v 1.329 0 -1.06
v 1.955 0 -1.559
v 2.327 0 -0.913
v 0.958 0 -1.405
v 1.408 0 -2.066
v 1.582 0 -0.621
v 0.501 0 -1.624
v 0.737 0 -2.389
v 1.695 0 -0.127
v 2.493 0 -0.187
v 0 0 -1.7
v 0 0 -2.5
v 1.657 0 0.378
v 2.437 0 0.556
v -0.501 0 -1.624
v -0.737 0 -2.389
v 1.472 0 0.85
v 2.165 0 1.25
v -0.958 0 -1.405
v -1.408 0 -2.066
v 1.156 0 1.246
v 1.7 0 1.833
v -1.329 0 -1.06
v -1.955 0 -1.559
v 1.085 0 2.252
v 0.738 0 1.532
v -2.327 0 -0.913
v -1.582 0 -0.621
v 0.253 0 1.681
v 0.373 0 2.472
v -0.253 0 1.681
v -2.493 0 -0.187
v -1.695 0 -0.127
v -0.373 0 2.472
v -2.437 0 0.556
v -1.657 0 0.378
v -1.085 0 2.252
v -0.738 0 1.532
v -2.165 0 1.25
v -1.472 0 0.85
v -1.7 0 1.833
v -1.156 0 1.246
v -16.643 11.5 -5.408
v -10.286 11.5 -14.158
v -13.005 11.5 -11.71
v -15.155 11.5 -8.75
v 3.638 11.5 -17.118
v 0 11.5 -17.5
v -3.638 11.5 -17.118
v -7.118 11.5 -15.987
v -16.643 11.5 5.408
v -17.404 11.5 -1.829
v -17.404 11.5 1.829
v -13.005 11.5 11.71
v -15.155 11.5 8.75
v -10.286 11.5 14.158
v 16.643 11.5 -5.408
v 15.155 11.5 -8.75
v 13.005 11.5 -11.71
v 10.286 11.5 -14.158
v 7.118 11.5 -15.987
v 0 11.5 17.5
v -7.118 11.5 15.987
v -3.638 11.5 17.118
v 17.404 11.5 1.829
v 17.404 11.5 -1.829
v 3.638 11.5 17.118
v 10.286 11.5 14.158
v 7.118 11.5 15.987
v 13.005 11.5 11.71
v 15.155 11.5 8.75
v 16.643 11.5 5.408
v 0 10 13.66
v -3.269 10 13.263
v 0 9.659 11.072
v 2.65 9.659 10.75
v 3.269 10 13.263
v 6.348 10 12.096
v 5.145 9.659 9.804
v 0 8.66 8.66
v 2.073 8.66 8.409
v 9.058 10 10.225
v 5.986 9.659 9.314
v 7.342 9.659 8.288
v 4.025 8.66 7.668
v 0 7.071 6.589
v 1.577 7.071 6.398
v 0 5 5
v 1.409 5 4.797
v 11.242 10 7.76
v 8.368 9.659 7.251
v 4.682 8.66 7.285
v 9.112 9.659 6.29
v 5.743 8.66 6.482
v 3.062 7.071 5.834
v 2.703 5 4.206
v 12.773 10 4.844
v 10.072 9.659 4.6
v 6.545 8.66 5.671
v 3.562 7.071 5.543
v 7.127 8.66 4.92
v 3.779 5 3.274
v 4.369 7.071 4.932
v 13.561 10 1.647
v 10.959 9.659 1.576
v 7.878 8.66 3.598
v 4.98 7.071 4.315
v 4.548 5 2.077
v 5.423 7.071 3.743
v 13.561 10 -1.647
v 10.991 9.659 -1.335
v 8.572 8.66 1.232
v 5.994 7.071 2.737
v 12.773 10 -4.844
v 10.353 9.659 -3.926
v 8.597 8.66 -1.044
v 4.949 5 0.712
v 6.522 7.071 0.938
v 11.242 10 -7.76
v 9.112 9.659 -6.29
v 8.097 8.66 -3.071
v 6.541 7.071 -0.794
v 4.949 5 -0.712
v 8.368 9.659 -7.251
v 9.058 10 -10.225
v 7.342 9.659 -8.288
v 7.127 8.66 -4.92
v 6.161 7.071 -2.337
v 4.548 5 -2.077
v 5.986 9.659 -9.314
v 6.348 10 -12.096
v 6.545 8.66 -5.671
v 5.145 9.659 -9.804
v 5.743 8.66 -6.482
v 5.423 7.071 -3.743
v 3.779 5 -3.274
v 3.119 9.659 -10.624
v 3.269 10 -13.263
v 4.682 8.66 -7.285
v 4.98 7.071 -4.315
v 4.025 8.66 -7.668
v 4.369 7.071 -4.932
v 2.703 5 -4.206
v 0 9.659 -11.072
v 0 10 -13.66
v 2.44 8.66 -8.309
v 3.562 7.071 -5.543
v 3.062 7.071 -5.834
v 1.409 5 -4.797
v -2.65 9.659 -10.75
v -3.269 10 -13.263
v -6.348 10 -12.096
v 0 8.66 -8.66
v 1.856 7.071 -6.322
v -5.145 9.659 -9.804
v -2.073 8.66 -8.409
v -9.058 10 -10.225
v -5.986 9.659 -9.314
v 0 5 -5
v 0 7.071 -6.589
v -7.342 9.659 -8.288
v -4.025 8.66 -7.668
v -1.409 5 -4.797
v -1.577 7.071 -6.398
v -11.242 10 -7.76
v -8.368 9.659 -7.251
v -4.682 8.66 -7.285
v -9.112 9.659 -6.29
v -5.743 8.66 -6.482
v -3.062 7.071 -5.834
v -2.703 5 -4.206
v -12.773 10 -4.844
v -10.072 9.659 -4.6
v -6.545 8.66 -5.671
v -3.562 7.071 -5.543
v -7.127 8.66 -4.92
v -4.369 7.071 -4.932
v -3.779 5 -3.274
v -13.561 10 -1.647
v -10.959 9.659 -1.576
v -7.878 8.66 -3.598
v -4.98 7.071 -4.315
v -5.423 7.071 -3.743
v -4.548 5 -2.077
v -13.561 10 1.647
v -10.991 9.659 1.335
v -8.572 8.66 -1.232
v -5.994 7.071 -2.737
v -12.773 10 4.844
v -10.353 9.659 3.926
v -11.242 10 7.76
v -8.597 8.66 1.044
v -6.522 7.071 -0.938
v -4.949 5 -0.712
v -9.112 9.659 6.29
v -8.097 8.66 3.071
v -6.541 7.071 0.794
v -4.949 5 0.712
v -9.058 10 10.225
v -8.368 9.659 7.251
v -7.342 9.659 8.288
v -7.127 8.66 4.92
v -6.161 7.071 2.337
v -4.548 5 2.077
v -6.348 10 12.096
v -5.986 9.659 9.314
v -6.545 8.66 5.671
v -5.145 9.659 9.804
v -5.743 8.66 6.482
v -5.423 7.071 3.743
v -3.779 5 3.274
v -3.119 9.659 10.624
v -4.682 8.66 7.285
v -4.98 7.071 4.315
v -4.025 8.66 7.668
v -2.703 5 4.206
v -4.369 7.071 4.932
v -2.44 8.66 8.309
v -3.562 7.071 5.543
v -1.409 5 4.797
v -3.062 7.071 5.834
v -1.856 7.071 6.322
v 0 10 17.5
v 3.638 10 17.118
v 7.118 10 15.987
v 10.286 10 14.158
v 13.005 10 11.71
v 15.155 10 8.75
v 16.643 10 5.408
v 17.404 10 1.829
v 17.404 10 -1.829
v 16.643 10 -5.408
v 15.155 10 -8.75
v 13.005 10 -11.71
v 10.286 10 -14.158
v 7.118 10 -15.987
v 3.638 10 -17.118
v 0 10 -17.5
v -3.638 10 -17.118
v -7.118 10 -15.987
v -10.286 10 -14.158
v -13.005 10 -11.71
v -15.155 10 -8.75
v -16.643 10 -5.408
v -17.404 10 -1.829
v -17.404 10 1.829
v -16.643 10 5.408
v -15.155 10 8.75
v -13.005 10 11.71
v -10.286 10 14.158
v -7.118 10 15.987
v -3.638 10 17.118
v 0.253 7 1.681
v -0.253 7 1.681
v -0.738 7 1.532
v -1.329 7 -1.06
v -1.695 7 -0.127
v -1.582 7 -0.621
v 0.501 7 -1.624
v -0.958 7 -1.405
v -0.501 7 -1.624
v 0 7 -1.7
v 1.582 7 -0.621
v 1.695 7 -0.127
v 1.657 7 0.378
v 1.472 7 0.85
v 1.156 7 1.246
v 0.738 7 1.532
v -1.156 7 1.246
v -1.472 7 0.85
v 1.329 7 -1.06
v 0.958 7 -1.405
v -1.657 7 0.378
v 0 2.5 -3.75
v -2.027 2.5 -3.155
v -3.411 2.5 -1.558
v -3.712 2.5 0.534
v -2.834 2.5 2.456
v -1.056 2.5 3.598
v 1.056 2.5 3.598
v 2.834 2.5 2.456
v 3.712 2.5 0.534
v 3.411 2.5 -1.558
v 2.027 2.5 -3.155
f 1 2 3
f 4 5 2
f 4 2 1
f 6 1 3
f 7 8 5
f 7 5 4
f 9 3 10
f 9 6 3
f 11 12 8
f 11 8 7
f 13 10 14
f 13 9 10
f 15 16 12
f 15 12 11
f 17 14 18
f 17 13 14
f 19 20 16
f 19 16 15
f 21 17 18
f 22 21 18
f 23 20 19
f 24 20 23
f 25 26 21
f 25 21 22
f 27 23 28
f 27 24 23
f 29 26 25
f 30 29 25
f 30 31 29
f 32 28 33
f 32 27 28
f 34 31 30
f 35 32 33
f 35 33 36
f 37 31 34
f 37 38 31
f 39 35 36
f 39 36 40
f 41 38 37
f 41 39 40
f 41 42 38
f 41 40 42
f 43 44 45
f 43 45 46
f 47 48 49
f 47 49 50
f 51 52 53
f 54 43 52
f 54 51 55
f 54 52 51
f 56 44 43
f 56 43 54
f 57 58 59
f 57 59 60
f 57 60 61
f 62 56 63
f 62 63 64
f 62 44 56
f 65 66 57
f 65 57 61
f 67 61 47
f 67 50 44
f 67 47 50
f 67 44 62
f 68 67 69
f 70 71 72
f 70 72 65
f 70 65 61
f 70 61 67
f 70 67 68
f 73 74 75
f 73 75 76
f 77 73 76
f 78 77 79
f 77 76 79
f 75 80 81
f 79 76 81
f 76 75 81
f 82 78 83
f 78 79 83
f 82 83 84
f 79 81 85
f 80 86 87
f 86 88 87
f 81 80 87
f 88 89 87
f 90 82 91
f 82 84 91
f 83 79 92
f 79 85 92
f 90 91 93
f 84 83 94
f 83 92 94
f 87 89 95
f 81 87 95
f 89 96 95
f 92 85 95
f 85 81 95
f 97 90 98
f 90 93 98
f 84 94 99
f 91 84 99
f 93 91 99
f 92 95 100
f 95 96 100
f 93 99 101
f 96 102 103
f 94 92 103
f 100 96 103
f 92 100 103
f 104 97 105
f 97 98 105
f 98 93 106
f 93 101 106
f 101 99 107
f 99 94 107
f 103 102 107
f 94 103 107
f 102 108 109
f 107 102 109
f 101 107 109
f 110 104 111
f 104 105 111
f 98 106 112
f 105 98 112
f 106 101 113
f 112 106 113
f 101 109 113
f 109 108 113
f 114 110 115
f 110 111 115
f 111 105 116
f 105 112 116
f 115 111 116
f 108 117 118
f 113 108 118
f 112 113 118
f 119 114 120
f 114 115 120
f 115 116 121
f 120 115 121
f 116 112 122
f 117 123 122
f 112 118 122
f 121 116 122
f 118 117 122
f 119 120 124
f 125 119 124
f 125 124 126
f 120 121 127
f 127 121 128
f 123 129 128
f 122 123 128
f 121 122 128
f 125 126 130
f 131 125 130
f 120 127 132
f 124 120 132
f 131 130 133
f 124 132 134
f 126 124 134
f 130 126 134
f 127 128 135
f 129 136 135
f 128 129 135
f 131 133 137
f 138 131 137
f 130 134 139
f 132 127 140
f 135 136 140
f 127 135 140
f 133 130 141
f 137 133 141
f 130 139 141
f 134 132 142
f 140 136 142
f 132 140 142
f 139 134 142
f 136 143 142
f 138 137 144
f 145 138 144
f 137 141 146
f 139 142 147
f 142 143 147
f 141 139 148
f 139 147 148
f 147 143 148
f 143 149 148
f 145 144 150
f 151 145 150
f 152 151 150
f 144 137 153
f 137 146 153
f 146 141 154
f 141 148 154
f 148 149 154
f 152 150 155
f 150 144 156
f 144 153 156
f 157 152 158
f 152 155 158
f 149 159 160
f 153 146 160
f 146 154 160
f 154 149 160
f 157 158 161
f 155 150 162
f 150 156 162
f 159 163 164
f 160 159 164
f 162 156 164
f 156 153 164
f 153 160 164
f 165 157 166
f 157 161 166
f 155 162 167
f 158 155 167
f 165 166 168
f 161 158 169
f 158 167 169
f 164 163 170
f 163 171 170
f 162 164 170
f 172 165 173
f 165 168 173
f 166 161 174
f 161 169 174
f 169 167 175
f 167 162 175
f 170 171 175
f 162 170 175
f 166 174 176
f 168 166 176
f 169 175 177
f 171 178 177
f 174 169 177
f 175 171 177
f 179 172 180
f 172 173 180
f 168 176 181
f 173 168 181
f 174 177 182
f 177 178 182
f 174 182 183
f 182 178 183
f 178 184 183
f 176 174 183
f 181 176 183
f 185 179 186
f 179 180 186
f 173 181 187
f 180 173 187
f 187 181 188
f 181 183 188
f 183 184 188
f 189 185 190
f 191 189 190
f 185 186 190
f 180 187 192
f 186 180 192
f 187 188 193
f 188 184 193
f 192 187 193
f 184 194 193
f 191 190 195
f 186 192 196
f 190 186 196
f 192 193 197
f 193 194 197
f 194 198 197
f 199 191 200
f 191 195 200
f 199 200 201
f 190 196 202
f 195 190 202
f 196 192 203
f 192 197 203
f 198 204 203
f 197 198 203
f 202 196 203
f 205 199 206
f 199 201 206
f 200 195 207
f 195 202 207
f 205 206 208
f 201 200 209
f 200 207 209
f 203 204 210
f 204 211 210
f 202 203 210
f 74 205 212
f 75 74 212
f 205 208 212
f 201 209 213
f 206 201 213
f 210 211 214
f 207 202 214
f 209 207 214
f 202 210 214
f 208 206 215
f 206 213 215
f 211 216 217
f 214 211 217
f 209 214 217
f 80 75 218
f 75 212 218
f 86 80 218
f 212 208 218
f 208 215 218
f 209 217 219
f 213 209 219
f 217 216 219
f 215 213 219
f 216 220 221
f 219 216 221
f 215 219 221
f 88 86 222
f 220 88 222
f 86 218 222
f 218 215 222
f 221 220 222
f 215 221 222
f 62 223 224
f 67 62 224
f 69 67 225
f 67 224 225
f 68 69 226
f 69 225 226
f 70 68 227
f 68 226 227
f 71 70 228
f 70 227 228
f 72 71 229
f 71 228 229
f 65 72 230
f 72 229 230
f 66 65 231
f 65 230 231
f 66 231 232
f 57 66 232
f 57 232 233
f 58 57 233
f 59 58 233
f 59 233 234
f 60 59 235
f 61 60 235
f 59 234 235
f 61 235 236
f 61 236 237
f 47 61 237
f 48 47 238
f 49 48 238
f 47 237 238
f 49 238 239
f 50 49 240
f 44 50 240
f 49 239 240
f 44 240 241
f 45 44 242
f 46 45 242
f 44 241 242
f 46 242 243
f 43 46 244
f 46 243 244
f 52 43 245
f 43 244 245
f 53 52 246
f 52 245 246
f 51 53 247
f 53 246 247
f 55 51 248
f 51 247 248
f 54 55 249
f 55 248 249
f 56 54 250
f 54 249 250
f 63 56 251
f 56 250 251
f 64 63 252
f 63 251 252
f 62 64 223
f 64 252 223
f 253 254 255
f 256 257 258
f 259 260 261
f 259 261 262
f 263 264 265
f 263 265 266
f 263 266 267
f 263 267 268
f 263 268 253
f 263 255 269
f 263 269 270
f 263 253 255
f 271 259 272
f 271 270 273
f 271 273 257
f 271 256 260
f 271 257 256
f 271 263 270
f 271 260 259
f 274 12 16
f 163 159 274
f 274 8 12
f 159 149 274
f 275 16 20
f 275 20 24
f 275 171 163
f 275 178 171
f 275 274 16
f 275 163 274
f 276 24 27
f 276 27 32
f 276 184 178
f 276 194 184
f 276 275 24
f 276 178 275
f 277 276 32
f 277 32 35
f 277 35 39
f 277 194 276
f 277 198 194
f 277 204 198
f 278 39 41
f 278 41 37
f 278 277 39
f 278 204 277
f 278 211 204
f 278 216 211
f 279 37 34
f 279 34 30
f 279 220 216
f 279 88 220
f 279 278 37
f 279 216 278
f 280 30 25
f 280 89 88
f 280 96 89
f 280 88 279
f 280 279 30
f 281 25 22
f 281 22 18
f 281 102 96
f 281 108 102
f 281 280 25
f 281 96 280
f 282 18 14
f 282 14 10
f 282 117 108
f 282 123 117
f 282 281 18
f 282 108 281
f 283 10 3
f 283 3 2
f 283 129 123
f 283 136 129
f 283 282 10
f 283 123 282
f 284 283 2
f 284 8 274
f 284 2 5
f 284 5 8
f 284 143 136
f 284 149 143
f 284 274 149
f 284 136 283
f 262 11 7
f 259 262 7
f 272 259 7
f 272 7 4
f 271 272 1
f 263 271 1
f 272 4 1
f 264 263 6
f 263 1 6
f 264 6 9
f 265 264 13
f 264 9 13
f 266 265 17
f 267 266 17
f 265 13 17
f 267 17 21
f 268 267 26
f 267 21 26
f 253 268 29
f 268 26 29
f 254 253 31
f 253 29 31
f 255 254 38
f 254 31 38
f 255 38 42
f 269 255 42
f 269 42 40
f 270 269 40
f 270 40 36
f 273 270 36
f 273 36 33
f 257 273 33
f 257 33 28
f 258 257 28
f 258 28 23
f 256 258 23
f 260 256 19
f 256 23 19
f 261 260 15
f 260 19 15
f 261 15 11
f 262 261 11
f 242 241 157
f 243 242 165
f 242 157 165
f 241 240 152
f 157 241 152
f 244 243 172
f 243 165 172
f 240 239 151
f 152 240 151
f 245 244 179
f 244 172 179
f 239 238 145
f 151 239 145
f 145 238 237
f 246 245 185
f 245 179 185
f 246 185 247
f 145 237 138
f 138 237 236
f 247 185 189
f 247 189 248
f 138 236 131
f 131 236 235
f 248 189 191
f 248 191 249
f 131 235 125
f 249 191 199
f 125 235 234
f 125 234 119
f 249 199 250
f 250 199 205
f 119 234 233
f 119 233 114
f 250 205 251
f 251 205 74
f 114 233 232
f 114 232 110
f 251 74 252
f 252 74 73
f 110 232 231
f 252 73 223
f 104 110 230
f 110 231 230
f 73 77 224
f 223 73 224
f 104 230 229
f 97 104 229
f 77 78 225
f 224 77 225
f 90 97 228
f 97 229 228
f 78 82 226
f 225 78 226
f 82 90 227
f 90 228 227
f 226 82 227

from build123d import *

# Parameters (mm, degrees)
SKETCH5_R           = 5
BOSS_EXTRUDE2_DEPTH = 5
SKETCH6_R           = 17.5
BOSS_EXTRUDE3_DEPTH = 1.5
SKETCH7_R           = 1.7
CUT_EXTRUDE1_DEPTH  = 7
FILLET1_R           = 10


with BuildPart() as part:
    # Sketch3 → Revolve1 (revolve)
    with BuildSketch(Plane.XY, mode=Mode.PRIVATE) as revolve1_sk:
        Polygon((0, 0), (2.5, 0), (5, 5), (0, 5), align=None)
    revolve(revolve1_sk.sketch.rotate(Axis((0, 0, 0), (0, 1, 0)), 90), axis=Axis((0, 0, 0), (0, 1, 0)))

    # Sketch5 → Boss-Extrude2 (add)
    with BuildSketch(Plane(origin=(0, 5, 0), x_dir=(1, 0, 0), z_dir=(0, 1, 0))):
        with Locations(Location((0, 0, 0), (0, 0, 270))):
            Circle(SKETCH5_R)
    extrude(amount=BOSS_EXTRUDE2_DEPTH)

    # Sketch6 → Boss-Extrude3 (add)
    with BuildSketch(Plane(origin=(0, 10, 0), x_dir=(1, 0, 0), z_dir=(0, 1, 0))):
        with Locations(Location((0, 0, 0), (0, 0, 270))):
            Circle(SKETCH6_R)
    extrude(amount=BOSS_EXTRUDE3_DEPTH)

    # Sketch7 → Cut-Extrude1 (cut)
    with BuildSketch(Plane.XZ):
        with Locations(Location((0, 0, 0), (0, 0, 270))):
            Circle(SKETCH7_R)
    extrude(amount=-CUT_EXTRUDE1_DEPTH, mode=Mode.SUBTRACT)

    # Fillet1
    # the kernel refuses this fillet: 10 mm, written as the material it adds along each edge
    with BuildSketch(Plane(origin=(0, 10, 0), x_dir=(0, 0, 1), z_dir=(-1, 0, 0))) as fillet1_piece_1:
        with BuildLine():
            CenterArc((13.660254038, -10), FILLET1_R, 90, 60)
            Line((5, -5), (4.826794919, -4.9))
            ThreePointArc((4.826794919, -4.9), (4.8, -2.5), (4.8, 0))
            Line((4.8, 0), (5, 0.2))
            Line((5, 0.2), (13.660254038, 0.2))
            Line((13.660254038, 0.2), (13.660254038, 0))
        make_face()
    revolve(axis=Axis((0, 10, 0), (0, 1, 0)))


solid = part.part
